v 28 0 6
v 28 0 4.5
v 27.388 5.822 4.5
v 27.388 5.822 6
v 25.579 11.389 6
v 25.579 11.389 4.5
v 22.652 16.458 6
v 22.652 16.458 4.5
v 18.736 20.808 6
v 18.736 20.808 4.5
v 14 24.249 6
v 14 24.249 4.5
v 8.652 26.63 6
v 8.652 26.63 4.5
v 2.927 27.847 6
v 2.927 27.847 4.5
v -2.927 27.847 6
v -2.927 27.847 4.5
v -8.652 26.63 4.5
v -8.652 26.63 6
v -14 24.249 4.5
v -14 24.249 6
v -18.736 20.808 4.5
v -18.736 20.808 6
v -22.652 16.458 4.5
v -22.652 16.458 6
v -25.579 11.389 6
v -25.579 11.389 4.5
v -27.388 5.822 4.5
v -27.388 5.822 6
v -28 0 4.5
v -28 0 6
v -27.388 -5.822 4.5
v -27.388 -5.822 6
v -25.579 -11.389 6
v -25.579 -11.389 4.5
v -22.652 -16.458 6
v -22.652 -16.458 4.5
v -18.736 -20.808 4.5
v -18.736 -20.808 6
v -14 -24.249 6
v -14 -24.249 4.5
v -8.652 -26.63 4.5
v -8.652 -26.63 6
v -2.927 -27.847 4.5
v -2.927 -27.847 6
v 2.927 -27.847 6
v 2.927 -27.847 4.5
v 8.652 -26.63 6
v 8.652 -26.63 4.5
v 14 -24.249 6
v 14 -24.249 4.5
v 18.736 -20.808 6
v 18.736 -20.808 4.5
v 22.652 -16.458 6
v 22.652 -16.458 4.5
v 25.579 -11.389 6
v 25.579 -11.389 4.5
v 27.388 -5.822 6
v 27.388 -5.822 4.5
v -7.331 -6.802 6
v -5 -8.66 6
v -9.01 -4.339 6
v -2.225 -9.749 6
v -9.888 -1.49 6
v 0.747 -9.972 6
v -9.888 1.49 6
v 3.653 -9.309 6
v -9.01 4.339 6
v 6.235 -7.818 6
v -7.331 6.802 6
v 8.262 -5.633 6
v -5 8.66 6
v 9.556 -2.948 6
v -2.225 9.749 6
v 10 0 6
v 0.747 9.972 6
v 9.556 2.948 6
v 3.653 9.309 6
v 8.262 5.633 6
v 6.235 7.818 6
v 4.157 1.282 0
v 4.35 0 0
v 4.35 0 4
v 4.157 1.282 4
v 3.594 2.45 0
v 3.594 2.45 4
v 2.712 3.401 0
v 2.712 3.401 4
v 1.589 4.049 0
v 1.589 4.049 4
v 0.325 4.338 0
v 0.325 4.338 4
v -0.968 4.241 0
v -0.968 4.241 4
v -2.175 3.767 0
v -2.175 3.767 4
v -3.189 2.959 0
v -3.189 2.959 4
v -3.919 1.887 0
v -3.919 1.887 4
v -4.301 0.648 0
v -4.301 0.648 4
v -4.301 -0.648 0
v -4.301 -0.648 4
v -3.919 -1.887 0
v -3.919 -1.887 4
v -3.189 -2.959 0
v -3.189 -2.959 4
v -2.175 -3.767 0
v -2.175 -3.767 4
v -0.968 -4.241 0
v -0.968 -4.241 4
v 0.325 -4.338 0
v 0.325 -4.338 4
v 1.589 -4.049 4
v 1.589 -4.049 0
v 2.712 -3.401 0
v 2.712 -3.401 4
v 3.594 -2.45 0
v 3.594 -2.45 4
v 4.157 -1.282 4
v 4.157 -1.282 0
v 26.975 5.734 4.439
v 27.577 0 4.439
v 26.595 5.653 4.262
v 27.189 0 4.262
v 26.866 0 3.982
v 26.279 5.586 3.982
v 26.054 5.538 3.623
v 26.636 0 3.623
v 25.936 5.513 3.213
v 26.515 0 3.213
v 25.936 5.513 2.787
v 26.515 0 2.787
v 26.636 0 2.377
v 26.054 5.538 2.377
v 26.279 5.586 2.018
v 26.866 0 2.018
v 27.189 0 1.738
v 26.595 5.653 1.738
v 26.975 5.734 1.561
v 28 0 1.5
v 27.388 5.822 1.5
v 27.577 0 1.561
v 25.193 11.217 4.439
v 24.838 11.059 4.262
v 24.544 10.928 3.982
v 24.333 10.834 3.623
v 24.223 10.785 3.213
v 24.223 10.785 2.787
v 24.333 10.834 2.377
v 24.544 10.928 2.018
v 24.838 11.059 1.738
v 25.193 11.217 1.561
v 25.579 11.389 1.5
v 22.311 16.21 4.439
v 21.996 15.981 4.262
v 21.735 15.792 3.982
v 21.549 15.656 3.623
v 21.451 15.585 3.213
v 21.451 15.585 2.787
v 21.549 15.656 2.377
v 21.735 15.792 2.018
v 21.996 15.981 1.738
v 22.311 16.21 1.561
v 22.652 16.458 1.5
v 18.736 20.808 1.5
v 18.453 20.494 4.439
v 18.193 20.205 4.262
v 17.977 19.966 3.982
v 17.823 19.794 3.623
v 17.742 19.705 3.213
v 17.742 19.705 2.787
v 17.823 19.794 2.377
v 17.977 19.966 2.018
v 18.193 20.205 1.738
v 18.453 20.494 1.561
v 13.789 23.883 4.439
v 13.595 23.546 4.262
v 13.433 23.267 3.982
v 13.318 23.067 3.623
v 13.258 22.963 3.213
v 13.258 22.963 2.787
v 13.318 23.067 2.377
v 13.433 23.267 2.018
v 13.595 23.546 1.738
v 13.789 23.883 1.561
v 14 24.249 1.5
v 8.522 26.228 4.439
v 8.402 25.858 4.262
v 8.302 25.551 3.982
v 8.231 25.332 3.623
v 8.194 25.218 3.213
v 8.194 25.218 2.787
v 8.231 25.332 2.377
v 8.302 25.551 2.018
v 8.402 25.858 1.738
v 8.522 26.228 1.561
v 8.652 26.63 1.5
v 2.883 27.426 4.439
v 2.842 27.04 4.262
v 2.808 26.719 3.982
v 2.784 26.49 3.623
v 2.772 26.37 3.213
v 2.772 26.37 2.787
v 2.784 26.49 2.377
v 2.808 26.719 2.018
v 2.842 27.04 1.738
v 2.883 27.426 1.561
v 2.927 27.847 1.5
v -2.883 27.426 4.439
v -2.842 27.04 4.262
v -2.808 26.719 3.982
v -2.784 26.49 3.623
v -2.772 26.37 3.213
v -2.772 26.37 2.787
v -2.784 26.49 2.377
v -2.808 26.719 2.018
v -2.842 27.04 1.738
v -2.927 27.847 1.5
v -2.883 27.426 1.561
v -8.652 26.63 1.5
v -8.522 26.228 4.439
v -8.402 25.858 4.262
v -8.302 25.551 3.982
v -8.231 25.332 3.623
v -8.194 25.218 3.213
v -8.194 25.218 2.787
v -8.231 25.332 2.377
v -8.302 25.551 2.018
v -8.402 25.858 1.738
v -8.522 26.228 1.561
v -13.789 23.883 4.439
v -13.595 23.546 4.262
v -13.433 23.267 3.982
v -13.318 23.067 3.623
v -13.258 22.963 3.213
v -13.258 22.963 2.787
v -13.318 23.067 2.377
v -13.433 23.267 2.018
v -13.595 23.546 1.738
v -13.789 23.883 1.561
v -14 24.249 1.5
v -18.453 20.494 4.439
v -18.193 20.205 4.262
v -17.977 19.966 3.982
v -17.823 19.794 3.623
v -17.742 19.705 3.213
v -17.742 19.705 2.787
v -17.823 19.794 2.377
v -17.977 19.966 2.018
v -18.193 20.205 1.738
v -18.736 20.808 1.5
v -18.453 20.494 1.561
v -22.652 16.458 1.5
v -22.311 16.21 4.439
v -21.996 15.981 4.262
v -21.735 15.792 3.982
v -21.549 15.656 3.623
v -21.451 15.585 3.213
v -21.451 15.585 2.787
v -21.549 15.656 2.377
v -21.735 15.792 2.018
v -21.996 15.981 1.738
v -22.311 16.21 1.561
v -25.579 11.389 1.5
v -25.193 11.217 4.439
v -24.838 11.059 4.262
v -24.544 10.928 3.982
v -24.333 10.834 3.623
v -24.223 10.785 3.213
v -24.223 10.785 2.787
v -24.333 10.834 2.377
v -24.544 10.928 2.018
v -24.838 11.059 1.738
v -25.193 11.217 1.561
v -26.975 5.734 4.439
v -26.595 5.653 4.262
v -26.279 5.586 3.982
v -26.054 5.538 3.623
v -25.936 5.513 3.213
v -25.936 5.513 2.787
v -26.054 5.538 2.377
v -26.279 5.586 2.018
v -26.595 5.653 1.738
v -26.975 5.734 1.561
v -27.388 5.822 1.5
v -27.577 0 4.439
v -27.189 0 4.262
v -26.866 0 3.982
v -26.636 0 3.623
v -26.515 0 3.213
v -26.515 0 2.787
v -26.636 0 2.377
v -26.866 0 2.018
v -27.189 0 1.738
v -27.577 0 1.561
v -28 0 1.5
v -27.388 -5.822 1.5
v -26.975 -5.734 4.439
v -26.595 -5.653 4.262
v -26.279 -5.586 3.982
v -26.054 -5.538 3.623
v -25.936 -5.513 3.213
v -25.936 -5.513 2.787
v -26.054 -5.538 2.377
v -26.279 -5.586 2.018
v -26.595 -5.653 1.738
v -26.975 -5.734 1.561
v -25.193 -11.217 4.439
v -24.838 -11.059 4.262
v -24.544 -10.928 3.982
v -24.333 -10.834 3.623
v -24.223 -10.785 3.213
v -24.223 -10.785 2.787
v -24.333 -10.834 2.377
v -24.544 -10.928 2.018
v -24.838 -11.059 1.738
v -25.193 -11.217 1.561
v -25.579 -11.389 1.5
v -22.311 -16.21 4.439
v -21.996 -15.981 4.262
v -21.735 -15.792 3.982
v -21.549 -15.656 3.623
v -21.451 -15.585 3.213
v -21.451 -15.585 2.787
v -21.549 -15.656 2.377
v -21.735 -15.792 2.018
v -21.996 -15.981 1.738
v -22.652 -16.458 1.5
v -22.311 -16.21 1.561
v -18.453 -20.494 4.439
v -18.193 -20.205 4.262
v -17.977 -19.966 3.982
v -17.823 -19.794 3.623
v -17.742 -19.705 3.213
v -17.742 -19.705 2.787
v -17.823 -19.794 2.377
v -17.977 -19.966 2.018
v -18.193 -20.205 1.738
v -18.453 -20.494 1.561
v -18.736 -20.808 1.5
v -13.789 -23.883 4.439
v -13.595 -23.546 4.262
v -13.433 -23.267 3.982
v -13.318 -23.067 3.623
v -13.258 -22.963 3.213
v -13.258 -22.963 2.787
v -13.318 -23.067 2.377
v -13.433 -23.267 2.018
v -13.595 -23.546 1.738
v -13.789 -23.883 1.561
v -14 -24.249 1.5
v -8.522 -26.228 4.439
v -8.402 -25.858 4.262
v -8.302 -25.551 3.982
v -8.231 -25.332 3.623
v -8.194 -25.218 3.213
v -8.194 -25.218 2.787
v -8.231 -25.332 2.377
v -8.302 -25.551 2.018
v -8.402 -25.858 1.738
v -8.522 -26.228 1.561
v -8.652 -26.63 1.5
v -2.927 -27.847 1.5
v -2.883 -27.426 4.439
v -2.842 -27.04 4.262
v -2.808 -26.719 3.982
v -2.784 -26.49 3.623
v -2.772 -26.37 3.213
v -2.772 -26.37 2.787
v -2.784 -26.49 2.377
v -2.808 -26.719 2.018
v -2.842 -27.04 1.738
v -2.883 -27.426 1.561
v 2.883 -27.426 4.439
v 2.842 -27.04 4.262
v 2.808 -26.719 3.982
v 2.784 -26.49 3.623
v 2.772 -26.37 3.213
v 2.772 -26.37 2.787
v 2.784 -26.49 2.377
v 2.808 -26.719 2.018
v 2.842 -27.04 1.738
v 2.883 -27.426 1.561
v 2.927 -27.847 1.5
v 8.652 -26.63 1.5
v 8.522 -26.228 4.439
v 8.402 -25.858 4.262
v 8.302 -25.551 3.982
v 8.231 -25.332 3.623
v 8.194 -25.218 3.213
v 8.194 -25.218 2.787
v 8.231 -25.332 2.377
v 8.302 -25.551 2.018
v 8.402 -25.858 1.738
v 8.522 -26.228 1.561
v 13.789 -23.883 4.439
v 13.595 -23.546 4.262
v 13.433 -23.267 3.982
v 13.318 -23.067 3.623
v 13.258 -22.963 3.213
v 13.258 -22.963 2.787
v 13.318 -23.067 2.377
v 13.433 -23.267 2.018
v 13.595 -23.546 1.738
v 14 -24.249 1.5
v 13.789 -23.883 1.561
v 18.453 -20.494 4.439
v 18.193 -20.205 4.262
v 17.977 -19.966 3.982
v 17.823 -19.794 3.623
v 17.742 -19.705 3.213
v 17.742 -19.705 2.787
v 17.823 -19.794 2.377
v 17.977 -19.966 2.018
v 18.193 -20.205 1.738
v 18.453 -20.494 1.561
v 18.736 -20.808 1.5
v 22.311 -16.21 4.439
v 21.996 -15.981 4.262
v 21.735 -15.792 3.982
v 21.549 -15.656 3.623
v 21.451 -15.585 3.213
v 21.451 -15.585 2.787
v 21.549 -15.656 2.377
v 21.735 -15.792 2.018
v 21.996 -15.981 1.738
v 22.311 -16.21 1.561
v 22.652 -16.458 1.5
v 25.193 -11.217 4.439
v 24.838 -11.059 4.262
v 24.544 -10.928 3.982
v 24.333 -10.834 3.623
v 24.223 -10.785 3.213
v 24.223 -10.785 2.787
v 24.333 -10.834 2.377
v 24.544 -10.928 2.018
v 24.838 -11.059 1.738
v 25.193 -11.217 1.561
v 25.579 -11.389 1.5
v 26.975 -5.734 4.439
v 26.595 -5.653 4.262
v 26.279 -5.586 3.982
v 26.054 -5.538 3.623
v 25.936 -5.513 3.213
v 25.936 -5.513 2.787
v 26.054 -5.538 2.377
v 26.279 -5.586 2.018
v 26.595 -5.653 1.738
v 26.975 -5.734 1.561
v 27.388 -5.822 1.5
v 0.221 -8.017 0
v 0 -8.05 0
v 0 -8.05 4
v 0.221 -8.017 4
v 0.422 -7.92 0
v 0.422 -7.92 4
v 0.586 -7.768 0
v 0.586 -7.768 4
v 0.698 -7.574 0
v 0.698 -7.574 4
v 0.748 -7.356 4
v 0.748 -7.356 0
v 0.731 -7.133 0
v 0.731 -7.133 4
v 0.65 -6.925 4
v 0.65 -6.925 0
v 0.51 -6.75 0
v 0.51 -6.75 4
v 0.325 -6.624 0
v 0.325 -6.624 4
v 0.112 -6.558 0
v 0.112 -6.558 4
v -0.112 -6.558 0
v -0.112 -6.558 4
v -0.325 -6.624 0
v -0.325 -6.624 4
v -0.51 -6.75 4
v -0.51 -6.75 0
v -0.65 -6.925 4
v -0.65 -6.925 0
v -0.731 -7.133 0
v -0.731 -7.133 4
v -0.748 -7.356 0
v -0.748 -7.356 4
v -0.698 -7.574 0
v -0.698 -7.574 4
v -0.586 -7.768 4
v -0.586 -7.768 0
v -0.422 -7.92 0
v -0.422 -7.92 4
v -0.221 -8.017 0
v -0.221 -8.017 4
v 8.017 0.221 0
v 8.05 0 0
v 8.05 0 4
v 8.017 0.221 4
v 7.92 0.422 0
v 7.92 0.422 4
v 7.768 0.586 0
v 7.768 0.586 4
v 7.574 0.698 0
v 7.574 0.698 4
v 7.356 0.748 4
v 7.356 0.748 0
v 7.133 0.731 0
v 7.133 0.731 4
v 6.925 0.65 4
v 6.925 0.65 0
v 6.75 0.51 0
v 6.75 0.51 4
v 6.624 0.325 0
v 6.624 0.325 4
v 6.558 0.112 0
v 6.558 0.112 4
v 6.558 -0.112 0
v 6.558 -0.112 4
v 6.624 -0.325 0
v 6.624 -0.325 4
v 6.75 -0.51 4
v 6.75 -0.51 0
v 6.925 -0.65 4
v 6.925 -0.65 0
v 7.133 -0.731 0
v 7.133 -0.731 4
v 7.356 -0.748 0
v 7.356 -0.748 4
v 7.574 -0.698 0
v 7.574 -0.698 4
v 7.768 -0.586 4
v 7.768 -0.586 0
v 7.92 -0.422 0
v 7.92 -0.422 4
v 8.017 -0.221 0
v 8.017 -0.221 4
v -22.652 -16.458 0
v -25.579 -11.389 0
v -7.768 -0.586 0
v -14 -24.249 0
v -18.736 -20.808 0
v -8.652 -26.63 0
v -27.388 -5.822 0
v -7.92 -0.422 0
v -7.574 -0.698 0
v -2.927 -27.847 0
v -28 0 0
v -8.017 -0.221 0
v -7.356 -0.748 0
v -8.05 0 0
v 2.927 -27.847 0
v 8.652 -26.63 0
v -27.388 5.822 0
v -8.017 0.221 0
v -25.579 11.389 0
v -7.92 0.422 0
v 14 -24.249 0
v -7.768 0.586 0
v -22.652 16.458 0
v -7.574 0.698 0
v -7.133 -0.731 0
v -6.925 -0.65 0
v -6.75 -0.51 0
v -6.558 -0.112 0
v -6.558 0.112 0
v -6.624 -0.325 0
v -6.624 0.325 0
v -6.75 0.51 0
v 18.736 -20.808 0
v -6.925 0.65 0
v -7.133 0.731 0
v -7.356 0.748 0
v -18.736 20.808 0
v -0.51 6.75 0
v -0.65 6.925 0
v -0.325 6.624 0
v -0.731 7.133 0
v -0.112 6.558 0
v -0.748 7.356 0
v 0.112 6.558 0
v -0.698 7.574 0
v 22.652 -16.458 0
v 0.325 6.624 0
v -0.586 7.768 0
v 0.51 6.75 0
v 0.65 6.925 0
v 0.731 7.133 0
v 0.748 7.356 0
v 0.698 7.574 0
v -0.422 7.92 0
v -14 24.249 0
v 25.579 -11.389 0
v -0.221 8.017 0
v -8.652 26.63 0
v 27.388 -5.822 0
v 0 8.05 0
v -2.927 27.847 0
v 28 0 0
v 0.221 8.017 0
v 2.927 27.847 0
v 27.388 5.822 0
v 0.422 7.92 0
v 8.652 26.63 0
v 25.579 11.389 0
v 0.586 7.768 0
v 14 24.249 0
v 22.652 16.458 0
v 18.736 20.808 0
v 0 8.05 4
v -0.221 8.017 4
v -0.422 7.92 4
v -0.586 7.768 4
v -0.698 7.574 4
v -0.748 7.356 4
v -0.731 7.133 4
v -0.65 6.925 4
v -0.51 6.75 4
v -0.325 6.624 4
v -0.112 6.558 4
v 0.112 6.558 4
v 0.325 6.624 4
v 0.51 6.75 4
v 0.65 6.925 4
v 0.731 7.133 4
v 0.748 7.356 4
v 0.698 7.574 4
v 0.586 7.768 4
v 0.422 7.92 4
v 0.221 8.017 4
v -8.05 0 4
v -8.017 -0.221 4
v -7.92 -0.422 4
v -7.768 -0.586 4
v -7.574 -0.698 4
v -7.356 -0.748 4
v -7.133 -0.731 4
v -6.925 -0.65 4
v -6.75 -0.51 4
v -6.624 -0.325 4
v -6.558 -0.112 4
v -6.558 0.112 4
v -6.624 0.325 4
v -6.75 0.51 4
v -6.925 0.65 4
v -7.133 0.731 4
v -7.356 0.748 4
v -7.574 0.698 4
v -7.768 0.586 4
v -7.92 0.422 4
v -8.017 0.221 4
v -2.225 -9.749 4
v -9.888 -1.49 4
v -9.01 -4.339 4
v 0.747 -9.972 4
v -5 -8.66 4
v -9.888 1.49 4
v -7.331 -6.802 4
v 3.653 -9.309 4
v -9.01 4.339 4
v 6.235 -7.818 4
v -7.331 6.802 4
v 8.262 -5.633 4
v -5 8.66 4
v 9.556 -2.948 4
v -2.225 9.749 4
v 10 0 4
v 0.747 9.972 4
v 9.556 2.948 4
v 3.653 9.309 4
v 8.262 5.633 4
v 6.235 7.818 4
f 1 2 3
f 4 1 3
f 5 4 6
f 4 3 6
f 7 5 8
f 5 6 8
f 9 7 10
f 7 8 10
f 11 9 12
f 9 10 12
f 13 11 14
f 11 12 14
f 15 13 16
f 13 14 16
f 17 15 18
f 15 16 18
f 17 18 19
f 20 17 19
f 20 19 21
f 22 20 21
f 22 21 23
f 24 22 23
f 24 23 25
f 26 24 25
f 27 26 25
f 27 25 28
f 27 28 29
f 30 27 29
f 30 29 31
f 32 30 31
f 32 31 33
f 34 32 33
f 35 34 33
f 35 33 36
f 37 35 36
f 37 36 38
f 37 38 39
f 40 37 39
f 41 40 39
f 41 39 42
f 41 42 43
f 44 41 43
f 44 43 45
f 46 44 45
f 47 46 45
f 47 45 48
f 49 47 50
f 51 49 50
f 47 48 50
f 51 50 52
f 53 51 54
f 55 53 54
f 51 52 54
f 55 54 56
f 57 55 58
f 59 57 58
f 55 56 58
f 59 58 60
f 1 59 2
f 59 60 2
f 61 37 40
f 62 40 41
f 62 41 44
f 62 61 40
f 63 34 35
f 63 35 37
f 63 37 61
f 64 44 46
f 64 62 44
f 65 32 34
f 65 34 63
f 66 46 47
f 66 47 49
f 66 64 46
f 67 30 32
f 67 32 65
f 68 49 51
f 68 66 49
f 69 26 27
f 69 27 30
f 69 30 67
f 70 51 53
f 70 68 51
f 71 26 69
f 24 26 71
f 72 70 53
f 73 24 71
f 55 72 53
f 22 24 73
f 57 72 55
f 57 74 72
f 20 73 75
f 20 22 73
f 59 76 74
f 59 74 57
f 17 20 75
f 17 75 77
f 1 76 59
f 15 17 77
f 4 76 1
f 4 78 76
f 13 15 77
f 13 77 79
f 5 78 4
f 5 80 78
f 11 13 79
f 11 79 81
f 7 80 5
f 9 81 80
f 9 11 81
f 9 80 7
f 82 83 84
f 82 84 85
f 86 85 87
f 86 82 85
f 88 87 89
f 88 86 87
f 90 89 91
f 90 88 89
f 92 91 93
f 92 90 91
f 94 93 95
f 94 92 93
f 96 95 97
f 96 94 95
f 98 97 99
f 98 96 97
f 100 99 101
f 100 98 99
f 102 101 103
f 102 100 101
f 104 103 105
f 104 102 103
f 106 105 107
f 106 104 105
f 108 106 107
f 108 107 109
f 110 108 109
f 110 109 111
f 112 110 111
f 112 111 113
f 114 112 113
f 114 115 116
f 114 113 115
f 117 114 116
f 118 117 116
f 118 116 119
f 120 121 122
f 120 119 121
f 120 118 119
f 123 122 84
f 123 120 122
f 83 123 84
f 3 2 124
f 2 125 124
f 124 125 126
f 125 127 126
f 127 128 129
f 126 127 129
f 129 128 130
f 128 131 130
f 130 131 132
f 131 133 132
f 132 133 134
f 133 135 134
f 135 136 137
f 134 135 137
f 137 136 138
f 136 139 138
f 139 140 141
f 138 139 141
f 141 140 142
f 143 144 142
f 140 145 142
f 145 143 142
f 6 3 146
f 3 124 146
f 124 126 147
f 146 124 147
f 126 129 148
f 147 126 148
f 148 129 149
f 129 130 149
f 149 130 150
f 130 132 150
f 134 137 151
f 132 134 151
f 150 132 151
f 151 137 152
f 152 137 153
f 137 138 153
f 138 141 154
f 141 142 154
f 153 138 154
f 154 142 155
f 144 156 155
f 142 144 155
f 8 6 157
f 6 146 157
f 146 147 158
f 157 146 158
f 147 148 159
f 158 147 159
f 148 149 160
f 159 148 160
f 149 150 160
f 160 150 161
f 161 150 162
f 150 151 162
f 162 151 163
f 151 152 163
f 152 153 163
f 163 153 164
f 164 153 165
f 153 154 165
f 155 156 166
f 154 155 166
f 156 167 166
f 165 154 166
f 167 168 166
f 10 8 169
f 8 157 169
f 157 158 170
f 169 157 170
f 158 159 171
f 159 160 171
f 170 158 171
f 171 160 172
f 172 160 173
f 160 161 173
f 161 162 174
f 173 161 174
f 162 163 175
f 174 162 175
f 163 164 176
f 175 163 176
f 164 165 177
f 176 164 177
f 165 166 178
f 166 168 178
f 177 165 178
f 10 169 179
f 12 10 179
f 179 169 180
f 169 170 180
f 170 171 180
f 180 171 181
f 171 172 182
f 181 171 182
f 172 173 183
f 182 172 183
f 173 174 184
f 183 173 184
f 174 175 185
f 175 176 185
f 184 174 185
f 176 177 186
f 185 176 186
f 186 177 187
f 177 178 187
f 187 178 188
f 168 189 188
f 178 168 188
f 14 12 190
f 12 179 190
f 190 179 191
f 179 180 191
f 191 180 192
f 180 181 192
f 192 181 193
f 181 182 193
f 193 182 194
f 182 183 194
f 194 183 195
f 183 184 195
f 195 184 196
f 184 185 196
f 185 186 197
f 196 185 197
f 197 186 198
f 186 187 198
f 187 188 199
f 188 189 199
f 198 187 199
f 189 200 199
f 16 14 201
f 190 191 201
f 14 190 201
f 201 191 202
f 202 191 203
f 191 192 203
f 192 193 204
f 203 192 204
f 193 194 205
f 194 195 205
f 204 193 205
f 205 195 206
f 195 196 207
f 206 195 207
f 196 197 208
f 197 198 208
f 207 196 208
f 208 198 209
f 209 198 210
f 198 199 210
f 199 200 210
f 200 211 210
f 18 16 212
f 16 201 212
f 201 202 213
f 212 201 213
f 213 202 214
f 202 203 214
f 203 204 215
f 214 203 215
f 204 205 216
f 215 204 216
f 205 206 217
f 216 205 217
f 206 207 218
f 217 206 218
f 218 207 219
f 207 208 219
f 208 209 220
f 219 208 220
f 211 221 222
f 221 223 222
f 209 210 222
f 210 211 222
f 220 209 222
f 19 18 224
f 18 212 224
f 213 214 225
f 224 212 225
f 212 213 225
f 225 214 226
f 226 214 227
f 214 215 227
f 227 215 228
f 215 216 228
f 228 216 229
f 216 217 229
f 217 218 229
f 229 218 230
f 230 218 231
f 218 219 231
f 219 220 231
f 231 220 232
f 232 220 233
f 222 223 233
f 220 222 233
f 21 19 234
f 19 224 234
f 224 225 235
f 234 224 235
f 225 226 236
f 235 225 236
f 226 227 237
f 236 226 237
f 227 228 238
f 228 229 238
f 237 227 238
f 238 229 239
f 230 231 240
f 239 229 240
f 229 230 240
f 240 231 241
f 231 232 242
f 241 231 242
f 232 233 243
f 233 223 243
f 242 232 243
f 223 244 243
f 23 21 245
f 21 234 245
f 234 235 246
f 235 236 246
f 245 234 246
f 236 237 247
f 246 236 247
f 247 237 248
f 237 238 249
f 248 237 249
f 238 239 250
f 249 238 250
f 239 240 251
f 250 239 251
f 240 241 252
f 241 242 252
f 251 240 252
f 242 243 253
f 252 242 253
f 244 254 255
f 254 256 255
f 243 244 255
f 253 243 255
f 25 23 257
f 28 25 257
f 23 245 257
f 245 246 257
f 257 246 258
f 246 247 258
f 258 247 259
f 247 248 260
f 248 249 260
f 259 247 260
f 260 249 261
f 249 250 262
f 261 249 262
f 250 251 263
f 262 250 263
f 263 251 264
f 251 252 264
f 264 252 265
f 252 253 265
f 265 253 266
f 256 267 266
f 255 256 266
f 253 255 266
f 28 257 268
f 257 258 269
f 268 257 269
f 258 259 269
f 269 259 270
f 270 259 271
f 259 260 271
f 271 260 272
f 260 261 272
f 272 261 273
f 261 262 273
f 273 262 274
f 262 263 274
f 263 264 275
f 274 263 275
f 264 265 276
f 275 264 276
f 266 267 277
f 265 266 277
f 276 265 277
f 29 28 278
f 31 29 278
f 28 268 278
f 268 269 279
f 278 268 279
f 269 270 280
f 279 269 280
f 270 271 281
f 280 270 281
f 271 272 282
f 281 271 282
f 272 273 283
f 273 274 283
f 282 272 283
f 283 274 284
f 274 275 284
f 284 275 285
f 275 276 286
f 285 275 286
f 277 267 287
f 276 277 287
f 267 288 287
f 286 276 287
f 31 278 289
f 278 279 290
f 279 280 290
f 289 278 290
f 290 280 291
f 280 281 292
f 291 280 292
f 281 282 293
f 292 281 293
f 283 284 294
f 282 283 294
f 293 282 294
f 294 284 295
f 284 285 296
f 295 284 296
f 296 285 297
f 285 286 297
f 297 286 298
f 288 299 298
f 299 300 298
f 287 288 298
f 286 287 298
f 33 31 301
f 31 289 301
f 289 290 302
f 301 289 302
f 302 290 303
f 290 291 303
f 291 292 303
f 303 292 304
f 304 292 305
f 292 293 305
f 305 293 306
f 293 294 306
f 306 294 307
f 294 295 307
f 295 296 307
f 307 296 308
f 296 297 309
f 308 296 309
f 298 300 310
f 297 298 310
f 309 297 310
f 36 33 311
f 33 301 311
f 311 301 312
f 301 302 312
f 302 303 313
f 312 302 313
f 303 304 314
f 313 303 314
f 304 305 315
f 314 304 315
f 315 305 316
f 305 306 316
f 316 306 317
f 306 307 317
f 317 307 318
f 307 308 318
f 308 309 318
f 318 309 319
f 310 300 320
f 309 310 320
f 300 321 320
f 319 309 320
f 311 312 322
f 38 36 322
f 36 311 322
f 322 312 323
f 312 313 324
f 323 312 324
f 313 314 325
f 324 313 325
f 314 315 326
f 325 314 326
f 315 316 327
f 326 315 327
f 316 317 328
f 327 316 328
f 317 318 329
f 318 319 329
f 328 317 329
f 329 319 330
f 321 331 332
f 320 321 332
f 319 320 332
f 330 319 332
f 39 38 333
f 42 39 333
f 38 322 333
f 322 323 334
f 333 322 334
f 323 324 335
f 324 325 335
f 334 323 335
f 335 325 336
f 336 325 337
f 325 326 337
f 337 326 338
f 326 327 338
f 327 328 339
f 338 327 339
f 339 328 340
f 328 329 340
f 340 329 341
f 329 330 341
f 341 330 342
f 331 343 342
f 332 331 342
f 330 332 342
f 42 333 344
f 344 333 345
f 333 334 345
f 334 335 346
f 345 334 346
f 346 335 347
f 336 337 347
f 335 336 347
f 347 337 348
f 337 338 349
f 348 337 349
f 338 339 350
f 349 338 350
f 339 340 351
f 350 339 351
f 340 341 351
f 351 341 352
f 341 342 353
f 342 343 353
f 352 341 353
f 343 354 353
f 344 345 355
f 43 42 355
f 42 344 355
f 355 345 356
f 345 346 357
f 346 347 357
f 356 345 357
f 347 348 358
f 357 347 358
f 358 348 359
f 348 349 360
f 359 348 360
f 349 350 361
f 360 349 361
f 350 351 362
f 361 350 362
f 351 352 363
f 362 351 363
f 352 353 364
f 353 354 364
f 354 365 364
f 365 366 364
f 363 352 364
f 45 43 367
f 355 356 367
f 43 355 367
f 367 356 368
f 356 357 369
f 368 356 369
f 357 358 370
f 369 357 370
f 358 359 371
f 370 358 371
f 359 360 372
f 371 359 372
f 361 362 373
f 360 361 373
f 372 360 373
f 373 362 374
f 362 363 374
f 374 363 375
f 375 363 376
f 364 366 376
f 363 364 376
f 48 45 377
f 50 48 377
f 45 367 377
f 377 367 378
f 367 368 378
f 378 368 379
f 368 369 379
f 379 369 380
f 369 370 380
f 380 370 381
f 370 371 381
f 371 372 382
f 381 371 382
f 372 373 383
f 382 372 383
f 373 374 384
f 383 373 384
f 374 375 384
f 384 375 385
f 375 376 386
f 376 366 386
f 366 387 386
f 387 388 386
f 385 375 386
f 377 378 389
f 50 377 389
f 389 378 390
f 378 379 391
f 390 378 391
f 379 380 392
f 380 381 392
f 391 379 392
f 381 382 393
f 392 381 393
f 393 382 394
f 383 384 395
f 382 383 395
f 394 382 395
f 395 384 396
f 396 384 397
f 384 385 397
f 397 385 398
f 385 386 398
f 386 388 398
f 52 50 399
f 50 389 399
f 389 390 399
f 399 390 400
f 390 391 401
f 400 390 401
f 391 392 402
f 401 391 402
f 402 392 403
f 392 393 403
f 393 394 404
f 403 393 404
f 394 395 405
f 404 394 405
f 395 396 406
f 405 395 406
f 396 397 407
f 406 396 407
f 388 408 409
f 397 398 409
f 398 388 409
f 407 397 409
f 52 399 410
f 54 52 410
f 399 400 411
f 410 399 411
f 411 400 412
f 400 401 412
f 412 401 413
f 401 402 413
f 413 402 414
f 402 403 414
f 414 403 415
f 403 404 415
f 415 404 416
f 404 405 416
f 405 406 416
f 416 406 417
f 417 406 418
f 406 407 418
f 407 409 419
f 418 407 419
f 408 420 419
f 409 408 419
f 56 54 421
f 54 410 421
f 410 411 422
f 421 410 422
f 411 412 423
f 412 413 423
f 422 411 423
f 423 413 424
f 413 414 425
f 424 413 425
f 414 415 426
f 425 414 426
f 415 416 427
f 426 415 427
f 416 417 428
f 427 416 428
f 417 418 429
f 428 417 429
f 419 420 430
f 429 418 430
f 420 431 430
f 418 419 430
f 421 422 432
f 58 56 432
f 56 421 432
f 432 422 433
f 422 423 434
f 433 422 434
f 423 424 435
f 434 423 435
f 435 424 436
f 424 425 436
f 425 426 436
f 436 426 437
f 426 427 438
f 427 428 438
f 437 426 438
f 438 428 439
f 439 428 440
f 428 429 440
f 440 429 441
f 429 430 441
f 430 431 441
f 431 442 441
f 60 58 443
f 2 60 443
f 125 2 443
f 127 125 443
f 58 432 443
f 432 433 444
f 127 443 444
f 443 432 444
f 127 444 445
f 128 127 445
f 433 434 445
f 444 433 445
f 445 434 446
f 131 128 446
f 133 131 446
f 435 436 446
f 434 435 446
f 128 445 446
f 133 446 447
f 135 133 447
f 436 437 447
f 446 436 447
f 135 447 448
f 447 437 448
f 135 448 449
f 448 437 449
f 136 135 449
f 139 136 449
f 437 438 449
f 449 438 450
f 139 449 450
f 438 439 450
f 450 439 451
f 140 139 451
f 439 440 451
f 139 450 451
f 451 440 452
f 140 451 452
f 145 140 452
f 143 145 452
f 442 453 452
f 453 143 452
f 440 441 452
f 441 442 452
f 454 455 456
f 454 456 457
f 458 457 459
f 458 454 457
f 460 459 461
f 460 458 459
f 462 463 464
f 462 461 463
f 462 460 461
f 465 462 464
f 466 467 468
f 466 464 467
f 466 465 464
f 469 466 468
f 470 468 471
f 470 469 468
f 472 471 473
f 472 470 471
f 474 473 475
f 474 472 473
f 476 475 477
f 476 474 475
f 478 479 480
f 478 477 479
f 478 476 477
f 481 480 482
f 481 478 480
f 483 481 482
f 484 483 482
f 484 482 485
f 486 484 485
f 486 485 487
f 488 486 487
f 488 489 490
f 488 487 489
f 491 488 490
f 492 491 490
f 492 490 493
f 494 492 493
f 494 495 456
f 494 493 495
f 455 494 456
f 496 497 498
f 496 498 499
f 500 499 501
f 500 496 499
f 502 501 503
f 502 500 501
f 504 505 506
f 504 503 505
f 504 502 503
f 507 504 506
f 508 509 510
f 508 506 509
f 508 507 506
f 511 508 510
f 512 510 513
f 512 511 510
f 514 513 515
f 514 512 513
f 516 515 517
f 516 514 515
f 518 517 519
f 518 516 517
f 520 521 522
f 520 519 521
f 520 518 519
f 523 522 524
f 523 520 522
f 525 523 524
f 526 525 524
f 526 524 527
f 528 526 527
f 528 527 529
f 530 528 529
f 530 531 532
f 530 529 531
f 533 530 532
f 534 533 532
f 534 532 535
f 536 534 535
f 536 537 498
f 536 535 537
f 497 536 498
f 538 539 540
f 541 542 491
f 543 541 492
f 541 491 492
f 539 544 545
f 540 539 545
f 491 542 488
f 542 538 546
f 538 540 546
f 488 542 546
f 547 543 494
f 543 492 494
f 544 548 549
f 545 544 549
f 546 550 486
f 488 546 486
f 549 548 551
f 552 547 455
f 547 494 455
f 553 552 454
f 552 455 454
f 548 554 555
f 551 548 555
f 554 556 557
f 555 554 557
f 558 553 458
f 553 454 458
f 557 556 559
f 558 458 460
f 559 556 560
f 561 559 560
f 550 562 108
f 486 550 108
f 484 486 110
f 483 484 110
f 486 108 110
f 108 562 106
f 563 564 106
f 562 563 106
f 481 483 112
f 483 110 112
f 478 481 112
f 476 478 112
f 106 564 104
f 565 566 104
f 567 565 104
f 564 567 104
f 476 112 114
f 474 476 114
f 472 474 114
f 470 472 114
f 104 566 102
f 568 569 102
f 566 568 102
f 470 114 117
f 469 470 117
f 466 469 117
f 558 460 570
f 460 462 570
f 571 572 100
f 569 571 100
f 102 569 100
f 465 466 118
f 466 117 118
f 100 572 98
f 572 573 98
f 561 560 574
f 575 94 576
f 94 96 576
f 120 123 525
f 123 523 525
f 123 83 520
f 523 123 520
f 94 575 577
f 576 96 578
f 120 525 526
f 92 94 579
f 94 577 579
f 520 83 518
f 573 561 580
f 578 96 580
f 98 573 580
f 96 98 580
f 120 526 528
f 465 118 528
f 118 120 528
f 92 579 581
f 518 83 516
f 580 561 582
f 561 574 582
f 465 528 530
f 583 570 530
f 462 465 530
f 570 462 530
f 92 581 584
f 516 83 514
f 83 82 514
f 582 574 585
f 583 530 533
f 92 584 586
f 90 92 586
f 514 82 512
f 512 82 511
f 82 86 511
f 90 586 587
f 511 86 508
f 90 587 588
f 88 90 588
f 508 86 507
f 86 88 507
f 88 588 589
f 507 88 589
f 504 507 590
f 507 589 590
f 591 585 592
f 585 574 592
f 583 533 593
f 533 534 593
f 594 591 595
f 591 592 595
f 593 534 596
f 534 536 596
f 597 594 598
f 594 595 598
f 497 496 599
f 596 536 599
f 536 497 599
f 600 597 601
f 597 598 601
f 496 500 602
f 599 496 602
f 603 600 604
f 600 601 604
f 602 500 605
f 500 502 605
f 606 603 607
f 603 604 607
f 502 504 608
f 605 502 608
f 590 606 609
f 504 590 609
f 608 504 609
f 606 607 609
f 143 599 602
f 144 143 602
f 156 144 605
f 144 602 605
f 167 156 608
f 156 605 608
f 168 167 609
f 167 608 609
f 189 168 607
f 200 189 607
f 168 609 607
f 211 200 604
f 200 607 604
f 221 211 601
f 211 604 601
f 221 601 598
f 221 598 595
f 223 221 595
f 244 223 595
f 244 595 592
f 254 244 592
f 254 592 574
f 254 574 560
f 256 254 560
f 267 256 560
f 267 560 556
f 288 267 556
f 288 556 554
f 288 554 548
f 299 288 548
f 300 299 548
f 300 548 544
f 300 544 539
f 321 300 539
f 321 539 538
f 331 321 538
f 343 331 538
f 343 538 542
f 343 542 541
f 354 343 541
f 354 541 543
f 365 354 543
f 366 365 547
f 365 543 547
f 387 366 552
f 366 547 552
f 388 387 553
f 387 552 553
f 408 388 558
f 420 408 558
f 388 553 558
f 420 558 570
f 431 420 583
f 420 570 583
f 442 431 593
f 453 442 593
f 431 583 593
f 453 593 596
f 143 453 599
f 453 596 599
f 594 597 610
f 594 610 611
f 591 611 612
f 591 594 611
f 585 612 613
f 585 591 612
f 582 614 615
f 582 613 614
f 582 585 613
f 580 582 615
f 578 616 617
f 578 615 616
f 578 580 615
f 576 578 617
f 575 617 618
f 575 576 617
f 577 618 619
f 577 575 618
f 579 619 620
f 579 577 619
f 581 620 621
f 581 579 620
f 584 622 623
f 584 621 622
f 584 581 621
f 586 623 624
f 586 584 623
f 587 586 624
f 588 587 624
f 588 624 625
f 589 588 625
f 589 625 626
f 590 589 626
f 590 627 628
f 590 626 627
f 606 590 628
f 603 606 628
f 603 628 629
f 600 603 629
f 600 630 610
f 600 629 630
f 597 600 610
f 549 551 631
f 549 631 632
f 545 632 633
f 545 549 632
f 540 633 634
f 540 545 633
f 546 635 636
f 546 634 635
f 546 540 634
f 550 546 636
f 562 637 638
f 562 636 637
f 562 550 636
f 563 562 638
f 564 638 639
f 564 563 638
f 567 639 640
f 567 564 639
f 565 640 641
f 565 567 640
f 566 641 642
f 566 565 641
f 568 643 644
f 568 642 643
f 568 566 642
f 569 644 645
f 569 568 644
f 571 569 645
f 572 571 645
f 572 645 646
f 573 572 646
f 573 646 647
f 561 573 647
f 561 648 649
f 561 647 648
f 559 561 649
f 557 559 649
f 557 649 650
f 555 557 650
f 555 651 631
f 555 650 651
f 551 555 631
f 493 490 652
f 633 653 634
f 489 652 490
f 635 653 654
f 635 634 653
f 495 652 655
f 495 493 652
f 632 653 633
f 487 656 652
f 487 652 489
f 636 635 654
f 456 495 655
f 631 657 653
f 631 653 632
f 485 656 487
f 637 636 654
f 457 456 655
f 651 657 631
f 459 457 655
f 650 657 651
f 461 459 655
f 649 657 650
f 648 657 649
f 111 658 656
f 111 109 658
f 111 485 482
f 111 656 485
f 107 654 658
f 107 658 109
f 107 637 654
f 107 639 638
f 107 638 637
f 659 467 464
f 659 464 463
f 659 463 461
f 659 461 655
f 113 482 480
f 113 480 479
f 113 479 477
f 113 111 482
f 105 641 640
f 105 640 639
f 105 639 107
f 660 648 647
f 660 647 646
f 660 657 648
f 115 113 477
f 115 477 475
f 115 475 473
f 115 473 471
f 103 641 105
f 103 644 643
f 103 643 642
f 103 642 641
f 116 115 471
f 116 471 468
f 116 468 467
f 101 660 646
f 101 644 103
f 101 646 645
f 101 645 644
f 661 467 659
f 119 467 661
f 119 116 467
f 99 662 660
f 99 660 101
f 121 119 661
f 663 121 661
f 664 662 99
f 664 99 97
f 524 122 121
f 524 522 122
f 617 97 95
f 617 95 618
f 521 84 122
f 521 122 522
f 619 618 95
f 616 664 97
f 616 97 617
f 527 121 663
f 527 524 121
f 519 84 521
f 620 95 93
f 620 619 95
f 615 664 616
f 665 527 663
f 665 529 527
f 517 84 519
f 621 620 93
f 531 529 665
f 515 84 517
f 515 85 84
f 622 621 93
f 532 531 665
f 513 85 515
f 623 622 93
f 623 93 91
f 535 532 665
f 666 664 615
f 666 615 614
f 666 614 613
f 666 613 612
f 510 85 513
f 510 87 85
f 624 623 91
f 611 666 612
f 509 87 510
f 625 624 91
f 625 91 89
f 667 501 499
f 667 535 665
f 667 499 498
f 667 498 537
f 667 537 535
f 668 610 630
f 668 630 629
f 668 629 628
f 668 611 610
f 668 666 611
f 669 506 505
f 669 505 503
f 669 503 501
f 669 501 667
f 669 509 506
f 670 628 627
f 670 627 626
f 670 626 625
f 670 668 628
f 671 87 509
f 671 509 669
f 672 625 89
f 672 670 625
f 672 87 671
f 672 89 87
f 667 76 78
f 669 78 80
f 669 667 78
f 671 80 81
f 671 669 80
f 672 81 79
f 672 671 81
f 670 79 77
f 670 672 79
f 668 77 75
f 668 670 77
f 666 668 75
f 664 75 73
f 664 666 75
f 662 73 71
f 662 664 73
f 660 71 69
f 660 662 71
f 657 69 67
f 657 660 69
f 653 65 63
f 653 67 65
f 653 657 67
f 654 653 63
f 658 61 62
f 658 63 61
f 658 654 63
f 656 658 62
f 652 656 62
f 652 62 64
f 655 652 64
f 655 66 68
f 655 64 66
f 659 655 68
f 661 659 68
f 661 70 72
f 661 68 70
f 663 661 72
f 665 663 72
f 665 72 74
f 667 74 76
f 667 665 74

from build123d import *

# Parameters (mm, degrees)
CYLINDER003_R     = 0.75
CYLINDER003_DEPTH = 10
ARRAY_COUNT       = 4
CYLINDER002_R     = 4.35
CYLINDER002_DEPTH = 10
CYLINDER001_R     = 10
CYLINDER001_DEPTH = 10
TORUS_R           = 1.5
CYLINDER_R        = 28
CYLINDER_DEPTH    = 6


with BuildPart() as array:
    # Cylinder003 → Cylinder003 (new body)
    with BuildSketch(Plane(origin=(7.3, 0, -5), x_dir=(1, 0, 0), z_dir=(0, 0, 1))):
        Circle(CYLINDER003_R)
    extrude(amount=CYLINDER003_DEPTH)

    # Array: Array ×4 about axis
    array_axis = Axis((0, 0, 0), (0, 0, 1))


with BuildPart() as array_1:
    add(array.part)
    for i in range(1, ARRAY_COUNT):
        add(array.part.rotate(array_axis, i * 360 / ARRAY_COUNT))


with BuildPart() as cylinder002:
    # Cylinder002 → Cylinder002 (new body)
    with BuildSketch(Plane.XY.offset(-4)):
        Circle(CYLINDER002_R)
    extrude(amount=CYLINDER002_DEPTH)


with BuildPart() as corona_serve:
    # Cylinder001 → Cylinder001 (new body)
    with BuildSketch(Plane.XY.offset(4)):
        Circle(CYLINDER001_R)
    extrude(amount=CYLINDER001_DEPTH)


with BuildPart() as torus:
    # Torus → Torus (revolve)
    with BuildSketch(Plane(origin=(0, 0, 3), x_dir=(1, 0, 0), z_dir=(0, -1, 0))):
        with Locations((28, 0)):
            Circle(TORUS_R)
    revolve(axis=Axis((0, 0, 3), (0, 0, 1)))


with BuildPart() as cut003:
    # Cylinder → Cylinder (new body)
    with BuildSketch(Plane.XY):
        Circle(CYLINDER_R)
    extrude(amount=CYLINDER_DEPTH)

    # Cut: cut Torus
    add(torus.part, mode=Mode.SUBTRACT)

    # Cut001: cut corona_serve
    add(corona_serve.part, mode=Mode.SUBTRACT)

    # Cut002: cut Cylinder002
    add(cylinder002.part, mode=Mode.SUBTRACT)

    # Cut003: cut Array
    add(array_1.part, mode=Mode.SUBTRACT)


solid = cut003.part
